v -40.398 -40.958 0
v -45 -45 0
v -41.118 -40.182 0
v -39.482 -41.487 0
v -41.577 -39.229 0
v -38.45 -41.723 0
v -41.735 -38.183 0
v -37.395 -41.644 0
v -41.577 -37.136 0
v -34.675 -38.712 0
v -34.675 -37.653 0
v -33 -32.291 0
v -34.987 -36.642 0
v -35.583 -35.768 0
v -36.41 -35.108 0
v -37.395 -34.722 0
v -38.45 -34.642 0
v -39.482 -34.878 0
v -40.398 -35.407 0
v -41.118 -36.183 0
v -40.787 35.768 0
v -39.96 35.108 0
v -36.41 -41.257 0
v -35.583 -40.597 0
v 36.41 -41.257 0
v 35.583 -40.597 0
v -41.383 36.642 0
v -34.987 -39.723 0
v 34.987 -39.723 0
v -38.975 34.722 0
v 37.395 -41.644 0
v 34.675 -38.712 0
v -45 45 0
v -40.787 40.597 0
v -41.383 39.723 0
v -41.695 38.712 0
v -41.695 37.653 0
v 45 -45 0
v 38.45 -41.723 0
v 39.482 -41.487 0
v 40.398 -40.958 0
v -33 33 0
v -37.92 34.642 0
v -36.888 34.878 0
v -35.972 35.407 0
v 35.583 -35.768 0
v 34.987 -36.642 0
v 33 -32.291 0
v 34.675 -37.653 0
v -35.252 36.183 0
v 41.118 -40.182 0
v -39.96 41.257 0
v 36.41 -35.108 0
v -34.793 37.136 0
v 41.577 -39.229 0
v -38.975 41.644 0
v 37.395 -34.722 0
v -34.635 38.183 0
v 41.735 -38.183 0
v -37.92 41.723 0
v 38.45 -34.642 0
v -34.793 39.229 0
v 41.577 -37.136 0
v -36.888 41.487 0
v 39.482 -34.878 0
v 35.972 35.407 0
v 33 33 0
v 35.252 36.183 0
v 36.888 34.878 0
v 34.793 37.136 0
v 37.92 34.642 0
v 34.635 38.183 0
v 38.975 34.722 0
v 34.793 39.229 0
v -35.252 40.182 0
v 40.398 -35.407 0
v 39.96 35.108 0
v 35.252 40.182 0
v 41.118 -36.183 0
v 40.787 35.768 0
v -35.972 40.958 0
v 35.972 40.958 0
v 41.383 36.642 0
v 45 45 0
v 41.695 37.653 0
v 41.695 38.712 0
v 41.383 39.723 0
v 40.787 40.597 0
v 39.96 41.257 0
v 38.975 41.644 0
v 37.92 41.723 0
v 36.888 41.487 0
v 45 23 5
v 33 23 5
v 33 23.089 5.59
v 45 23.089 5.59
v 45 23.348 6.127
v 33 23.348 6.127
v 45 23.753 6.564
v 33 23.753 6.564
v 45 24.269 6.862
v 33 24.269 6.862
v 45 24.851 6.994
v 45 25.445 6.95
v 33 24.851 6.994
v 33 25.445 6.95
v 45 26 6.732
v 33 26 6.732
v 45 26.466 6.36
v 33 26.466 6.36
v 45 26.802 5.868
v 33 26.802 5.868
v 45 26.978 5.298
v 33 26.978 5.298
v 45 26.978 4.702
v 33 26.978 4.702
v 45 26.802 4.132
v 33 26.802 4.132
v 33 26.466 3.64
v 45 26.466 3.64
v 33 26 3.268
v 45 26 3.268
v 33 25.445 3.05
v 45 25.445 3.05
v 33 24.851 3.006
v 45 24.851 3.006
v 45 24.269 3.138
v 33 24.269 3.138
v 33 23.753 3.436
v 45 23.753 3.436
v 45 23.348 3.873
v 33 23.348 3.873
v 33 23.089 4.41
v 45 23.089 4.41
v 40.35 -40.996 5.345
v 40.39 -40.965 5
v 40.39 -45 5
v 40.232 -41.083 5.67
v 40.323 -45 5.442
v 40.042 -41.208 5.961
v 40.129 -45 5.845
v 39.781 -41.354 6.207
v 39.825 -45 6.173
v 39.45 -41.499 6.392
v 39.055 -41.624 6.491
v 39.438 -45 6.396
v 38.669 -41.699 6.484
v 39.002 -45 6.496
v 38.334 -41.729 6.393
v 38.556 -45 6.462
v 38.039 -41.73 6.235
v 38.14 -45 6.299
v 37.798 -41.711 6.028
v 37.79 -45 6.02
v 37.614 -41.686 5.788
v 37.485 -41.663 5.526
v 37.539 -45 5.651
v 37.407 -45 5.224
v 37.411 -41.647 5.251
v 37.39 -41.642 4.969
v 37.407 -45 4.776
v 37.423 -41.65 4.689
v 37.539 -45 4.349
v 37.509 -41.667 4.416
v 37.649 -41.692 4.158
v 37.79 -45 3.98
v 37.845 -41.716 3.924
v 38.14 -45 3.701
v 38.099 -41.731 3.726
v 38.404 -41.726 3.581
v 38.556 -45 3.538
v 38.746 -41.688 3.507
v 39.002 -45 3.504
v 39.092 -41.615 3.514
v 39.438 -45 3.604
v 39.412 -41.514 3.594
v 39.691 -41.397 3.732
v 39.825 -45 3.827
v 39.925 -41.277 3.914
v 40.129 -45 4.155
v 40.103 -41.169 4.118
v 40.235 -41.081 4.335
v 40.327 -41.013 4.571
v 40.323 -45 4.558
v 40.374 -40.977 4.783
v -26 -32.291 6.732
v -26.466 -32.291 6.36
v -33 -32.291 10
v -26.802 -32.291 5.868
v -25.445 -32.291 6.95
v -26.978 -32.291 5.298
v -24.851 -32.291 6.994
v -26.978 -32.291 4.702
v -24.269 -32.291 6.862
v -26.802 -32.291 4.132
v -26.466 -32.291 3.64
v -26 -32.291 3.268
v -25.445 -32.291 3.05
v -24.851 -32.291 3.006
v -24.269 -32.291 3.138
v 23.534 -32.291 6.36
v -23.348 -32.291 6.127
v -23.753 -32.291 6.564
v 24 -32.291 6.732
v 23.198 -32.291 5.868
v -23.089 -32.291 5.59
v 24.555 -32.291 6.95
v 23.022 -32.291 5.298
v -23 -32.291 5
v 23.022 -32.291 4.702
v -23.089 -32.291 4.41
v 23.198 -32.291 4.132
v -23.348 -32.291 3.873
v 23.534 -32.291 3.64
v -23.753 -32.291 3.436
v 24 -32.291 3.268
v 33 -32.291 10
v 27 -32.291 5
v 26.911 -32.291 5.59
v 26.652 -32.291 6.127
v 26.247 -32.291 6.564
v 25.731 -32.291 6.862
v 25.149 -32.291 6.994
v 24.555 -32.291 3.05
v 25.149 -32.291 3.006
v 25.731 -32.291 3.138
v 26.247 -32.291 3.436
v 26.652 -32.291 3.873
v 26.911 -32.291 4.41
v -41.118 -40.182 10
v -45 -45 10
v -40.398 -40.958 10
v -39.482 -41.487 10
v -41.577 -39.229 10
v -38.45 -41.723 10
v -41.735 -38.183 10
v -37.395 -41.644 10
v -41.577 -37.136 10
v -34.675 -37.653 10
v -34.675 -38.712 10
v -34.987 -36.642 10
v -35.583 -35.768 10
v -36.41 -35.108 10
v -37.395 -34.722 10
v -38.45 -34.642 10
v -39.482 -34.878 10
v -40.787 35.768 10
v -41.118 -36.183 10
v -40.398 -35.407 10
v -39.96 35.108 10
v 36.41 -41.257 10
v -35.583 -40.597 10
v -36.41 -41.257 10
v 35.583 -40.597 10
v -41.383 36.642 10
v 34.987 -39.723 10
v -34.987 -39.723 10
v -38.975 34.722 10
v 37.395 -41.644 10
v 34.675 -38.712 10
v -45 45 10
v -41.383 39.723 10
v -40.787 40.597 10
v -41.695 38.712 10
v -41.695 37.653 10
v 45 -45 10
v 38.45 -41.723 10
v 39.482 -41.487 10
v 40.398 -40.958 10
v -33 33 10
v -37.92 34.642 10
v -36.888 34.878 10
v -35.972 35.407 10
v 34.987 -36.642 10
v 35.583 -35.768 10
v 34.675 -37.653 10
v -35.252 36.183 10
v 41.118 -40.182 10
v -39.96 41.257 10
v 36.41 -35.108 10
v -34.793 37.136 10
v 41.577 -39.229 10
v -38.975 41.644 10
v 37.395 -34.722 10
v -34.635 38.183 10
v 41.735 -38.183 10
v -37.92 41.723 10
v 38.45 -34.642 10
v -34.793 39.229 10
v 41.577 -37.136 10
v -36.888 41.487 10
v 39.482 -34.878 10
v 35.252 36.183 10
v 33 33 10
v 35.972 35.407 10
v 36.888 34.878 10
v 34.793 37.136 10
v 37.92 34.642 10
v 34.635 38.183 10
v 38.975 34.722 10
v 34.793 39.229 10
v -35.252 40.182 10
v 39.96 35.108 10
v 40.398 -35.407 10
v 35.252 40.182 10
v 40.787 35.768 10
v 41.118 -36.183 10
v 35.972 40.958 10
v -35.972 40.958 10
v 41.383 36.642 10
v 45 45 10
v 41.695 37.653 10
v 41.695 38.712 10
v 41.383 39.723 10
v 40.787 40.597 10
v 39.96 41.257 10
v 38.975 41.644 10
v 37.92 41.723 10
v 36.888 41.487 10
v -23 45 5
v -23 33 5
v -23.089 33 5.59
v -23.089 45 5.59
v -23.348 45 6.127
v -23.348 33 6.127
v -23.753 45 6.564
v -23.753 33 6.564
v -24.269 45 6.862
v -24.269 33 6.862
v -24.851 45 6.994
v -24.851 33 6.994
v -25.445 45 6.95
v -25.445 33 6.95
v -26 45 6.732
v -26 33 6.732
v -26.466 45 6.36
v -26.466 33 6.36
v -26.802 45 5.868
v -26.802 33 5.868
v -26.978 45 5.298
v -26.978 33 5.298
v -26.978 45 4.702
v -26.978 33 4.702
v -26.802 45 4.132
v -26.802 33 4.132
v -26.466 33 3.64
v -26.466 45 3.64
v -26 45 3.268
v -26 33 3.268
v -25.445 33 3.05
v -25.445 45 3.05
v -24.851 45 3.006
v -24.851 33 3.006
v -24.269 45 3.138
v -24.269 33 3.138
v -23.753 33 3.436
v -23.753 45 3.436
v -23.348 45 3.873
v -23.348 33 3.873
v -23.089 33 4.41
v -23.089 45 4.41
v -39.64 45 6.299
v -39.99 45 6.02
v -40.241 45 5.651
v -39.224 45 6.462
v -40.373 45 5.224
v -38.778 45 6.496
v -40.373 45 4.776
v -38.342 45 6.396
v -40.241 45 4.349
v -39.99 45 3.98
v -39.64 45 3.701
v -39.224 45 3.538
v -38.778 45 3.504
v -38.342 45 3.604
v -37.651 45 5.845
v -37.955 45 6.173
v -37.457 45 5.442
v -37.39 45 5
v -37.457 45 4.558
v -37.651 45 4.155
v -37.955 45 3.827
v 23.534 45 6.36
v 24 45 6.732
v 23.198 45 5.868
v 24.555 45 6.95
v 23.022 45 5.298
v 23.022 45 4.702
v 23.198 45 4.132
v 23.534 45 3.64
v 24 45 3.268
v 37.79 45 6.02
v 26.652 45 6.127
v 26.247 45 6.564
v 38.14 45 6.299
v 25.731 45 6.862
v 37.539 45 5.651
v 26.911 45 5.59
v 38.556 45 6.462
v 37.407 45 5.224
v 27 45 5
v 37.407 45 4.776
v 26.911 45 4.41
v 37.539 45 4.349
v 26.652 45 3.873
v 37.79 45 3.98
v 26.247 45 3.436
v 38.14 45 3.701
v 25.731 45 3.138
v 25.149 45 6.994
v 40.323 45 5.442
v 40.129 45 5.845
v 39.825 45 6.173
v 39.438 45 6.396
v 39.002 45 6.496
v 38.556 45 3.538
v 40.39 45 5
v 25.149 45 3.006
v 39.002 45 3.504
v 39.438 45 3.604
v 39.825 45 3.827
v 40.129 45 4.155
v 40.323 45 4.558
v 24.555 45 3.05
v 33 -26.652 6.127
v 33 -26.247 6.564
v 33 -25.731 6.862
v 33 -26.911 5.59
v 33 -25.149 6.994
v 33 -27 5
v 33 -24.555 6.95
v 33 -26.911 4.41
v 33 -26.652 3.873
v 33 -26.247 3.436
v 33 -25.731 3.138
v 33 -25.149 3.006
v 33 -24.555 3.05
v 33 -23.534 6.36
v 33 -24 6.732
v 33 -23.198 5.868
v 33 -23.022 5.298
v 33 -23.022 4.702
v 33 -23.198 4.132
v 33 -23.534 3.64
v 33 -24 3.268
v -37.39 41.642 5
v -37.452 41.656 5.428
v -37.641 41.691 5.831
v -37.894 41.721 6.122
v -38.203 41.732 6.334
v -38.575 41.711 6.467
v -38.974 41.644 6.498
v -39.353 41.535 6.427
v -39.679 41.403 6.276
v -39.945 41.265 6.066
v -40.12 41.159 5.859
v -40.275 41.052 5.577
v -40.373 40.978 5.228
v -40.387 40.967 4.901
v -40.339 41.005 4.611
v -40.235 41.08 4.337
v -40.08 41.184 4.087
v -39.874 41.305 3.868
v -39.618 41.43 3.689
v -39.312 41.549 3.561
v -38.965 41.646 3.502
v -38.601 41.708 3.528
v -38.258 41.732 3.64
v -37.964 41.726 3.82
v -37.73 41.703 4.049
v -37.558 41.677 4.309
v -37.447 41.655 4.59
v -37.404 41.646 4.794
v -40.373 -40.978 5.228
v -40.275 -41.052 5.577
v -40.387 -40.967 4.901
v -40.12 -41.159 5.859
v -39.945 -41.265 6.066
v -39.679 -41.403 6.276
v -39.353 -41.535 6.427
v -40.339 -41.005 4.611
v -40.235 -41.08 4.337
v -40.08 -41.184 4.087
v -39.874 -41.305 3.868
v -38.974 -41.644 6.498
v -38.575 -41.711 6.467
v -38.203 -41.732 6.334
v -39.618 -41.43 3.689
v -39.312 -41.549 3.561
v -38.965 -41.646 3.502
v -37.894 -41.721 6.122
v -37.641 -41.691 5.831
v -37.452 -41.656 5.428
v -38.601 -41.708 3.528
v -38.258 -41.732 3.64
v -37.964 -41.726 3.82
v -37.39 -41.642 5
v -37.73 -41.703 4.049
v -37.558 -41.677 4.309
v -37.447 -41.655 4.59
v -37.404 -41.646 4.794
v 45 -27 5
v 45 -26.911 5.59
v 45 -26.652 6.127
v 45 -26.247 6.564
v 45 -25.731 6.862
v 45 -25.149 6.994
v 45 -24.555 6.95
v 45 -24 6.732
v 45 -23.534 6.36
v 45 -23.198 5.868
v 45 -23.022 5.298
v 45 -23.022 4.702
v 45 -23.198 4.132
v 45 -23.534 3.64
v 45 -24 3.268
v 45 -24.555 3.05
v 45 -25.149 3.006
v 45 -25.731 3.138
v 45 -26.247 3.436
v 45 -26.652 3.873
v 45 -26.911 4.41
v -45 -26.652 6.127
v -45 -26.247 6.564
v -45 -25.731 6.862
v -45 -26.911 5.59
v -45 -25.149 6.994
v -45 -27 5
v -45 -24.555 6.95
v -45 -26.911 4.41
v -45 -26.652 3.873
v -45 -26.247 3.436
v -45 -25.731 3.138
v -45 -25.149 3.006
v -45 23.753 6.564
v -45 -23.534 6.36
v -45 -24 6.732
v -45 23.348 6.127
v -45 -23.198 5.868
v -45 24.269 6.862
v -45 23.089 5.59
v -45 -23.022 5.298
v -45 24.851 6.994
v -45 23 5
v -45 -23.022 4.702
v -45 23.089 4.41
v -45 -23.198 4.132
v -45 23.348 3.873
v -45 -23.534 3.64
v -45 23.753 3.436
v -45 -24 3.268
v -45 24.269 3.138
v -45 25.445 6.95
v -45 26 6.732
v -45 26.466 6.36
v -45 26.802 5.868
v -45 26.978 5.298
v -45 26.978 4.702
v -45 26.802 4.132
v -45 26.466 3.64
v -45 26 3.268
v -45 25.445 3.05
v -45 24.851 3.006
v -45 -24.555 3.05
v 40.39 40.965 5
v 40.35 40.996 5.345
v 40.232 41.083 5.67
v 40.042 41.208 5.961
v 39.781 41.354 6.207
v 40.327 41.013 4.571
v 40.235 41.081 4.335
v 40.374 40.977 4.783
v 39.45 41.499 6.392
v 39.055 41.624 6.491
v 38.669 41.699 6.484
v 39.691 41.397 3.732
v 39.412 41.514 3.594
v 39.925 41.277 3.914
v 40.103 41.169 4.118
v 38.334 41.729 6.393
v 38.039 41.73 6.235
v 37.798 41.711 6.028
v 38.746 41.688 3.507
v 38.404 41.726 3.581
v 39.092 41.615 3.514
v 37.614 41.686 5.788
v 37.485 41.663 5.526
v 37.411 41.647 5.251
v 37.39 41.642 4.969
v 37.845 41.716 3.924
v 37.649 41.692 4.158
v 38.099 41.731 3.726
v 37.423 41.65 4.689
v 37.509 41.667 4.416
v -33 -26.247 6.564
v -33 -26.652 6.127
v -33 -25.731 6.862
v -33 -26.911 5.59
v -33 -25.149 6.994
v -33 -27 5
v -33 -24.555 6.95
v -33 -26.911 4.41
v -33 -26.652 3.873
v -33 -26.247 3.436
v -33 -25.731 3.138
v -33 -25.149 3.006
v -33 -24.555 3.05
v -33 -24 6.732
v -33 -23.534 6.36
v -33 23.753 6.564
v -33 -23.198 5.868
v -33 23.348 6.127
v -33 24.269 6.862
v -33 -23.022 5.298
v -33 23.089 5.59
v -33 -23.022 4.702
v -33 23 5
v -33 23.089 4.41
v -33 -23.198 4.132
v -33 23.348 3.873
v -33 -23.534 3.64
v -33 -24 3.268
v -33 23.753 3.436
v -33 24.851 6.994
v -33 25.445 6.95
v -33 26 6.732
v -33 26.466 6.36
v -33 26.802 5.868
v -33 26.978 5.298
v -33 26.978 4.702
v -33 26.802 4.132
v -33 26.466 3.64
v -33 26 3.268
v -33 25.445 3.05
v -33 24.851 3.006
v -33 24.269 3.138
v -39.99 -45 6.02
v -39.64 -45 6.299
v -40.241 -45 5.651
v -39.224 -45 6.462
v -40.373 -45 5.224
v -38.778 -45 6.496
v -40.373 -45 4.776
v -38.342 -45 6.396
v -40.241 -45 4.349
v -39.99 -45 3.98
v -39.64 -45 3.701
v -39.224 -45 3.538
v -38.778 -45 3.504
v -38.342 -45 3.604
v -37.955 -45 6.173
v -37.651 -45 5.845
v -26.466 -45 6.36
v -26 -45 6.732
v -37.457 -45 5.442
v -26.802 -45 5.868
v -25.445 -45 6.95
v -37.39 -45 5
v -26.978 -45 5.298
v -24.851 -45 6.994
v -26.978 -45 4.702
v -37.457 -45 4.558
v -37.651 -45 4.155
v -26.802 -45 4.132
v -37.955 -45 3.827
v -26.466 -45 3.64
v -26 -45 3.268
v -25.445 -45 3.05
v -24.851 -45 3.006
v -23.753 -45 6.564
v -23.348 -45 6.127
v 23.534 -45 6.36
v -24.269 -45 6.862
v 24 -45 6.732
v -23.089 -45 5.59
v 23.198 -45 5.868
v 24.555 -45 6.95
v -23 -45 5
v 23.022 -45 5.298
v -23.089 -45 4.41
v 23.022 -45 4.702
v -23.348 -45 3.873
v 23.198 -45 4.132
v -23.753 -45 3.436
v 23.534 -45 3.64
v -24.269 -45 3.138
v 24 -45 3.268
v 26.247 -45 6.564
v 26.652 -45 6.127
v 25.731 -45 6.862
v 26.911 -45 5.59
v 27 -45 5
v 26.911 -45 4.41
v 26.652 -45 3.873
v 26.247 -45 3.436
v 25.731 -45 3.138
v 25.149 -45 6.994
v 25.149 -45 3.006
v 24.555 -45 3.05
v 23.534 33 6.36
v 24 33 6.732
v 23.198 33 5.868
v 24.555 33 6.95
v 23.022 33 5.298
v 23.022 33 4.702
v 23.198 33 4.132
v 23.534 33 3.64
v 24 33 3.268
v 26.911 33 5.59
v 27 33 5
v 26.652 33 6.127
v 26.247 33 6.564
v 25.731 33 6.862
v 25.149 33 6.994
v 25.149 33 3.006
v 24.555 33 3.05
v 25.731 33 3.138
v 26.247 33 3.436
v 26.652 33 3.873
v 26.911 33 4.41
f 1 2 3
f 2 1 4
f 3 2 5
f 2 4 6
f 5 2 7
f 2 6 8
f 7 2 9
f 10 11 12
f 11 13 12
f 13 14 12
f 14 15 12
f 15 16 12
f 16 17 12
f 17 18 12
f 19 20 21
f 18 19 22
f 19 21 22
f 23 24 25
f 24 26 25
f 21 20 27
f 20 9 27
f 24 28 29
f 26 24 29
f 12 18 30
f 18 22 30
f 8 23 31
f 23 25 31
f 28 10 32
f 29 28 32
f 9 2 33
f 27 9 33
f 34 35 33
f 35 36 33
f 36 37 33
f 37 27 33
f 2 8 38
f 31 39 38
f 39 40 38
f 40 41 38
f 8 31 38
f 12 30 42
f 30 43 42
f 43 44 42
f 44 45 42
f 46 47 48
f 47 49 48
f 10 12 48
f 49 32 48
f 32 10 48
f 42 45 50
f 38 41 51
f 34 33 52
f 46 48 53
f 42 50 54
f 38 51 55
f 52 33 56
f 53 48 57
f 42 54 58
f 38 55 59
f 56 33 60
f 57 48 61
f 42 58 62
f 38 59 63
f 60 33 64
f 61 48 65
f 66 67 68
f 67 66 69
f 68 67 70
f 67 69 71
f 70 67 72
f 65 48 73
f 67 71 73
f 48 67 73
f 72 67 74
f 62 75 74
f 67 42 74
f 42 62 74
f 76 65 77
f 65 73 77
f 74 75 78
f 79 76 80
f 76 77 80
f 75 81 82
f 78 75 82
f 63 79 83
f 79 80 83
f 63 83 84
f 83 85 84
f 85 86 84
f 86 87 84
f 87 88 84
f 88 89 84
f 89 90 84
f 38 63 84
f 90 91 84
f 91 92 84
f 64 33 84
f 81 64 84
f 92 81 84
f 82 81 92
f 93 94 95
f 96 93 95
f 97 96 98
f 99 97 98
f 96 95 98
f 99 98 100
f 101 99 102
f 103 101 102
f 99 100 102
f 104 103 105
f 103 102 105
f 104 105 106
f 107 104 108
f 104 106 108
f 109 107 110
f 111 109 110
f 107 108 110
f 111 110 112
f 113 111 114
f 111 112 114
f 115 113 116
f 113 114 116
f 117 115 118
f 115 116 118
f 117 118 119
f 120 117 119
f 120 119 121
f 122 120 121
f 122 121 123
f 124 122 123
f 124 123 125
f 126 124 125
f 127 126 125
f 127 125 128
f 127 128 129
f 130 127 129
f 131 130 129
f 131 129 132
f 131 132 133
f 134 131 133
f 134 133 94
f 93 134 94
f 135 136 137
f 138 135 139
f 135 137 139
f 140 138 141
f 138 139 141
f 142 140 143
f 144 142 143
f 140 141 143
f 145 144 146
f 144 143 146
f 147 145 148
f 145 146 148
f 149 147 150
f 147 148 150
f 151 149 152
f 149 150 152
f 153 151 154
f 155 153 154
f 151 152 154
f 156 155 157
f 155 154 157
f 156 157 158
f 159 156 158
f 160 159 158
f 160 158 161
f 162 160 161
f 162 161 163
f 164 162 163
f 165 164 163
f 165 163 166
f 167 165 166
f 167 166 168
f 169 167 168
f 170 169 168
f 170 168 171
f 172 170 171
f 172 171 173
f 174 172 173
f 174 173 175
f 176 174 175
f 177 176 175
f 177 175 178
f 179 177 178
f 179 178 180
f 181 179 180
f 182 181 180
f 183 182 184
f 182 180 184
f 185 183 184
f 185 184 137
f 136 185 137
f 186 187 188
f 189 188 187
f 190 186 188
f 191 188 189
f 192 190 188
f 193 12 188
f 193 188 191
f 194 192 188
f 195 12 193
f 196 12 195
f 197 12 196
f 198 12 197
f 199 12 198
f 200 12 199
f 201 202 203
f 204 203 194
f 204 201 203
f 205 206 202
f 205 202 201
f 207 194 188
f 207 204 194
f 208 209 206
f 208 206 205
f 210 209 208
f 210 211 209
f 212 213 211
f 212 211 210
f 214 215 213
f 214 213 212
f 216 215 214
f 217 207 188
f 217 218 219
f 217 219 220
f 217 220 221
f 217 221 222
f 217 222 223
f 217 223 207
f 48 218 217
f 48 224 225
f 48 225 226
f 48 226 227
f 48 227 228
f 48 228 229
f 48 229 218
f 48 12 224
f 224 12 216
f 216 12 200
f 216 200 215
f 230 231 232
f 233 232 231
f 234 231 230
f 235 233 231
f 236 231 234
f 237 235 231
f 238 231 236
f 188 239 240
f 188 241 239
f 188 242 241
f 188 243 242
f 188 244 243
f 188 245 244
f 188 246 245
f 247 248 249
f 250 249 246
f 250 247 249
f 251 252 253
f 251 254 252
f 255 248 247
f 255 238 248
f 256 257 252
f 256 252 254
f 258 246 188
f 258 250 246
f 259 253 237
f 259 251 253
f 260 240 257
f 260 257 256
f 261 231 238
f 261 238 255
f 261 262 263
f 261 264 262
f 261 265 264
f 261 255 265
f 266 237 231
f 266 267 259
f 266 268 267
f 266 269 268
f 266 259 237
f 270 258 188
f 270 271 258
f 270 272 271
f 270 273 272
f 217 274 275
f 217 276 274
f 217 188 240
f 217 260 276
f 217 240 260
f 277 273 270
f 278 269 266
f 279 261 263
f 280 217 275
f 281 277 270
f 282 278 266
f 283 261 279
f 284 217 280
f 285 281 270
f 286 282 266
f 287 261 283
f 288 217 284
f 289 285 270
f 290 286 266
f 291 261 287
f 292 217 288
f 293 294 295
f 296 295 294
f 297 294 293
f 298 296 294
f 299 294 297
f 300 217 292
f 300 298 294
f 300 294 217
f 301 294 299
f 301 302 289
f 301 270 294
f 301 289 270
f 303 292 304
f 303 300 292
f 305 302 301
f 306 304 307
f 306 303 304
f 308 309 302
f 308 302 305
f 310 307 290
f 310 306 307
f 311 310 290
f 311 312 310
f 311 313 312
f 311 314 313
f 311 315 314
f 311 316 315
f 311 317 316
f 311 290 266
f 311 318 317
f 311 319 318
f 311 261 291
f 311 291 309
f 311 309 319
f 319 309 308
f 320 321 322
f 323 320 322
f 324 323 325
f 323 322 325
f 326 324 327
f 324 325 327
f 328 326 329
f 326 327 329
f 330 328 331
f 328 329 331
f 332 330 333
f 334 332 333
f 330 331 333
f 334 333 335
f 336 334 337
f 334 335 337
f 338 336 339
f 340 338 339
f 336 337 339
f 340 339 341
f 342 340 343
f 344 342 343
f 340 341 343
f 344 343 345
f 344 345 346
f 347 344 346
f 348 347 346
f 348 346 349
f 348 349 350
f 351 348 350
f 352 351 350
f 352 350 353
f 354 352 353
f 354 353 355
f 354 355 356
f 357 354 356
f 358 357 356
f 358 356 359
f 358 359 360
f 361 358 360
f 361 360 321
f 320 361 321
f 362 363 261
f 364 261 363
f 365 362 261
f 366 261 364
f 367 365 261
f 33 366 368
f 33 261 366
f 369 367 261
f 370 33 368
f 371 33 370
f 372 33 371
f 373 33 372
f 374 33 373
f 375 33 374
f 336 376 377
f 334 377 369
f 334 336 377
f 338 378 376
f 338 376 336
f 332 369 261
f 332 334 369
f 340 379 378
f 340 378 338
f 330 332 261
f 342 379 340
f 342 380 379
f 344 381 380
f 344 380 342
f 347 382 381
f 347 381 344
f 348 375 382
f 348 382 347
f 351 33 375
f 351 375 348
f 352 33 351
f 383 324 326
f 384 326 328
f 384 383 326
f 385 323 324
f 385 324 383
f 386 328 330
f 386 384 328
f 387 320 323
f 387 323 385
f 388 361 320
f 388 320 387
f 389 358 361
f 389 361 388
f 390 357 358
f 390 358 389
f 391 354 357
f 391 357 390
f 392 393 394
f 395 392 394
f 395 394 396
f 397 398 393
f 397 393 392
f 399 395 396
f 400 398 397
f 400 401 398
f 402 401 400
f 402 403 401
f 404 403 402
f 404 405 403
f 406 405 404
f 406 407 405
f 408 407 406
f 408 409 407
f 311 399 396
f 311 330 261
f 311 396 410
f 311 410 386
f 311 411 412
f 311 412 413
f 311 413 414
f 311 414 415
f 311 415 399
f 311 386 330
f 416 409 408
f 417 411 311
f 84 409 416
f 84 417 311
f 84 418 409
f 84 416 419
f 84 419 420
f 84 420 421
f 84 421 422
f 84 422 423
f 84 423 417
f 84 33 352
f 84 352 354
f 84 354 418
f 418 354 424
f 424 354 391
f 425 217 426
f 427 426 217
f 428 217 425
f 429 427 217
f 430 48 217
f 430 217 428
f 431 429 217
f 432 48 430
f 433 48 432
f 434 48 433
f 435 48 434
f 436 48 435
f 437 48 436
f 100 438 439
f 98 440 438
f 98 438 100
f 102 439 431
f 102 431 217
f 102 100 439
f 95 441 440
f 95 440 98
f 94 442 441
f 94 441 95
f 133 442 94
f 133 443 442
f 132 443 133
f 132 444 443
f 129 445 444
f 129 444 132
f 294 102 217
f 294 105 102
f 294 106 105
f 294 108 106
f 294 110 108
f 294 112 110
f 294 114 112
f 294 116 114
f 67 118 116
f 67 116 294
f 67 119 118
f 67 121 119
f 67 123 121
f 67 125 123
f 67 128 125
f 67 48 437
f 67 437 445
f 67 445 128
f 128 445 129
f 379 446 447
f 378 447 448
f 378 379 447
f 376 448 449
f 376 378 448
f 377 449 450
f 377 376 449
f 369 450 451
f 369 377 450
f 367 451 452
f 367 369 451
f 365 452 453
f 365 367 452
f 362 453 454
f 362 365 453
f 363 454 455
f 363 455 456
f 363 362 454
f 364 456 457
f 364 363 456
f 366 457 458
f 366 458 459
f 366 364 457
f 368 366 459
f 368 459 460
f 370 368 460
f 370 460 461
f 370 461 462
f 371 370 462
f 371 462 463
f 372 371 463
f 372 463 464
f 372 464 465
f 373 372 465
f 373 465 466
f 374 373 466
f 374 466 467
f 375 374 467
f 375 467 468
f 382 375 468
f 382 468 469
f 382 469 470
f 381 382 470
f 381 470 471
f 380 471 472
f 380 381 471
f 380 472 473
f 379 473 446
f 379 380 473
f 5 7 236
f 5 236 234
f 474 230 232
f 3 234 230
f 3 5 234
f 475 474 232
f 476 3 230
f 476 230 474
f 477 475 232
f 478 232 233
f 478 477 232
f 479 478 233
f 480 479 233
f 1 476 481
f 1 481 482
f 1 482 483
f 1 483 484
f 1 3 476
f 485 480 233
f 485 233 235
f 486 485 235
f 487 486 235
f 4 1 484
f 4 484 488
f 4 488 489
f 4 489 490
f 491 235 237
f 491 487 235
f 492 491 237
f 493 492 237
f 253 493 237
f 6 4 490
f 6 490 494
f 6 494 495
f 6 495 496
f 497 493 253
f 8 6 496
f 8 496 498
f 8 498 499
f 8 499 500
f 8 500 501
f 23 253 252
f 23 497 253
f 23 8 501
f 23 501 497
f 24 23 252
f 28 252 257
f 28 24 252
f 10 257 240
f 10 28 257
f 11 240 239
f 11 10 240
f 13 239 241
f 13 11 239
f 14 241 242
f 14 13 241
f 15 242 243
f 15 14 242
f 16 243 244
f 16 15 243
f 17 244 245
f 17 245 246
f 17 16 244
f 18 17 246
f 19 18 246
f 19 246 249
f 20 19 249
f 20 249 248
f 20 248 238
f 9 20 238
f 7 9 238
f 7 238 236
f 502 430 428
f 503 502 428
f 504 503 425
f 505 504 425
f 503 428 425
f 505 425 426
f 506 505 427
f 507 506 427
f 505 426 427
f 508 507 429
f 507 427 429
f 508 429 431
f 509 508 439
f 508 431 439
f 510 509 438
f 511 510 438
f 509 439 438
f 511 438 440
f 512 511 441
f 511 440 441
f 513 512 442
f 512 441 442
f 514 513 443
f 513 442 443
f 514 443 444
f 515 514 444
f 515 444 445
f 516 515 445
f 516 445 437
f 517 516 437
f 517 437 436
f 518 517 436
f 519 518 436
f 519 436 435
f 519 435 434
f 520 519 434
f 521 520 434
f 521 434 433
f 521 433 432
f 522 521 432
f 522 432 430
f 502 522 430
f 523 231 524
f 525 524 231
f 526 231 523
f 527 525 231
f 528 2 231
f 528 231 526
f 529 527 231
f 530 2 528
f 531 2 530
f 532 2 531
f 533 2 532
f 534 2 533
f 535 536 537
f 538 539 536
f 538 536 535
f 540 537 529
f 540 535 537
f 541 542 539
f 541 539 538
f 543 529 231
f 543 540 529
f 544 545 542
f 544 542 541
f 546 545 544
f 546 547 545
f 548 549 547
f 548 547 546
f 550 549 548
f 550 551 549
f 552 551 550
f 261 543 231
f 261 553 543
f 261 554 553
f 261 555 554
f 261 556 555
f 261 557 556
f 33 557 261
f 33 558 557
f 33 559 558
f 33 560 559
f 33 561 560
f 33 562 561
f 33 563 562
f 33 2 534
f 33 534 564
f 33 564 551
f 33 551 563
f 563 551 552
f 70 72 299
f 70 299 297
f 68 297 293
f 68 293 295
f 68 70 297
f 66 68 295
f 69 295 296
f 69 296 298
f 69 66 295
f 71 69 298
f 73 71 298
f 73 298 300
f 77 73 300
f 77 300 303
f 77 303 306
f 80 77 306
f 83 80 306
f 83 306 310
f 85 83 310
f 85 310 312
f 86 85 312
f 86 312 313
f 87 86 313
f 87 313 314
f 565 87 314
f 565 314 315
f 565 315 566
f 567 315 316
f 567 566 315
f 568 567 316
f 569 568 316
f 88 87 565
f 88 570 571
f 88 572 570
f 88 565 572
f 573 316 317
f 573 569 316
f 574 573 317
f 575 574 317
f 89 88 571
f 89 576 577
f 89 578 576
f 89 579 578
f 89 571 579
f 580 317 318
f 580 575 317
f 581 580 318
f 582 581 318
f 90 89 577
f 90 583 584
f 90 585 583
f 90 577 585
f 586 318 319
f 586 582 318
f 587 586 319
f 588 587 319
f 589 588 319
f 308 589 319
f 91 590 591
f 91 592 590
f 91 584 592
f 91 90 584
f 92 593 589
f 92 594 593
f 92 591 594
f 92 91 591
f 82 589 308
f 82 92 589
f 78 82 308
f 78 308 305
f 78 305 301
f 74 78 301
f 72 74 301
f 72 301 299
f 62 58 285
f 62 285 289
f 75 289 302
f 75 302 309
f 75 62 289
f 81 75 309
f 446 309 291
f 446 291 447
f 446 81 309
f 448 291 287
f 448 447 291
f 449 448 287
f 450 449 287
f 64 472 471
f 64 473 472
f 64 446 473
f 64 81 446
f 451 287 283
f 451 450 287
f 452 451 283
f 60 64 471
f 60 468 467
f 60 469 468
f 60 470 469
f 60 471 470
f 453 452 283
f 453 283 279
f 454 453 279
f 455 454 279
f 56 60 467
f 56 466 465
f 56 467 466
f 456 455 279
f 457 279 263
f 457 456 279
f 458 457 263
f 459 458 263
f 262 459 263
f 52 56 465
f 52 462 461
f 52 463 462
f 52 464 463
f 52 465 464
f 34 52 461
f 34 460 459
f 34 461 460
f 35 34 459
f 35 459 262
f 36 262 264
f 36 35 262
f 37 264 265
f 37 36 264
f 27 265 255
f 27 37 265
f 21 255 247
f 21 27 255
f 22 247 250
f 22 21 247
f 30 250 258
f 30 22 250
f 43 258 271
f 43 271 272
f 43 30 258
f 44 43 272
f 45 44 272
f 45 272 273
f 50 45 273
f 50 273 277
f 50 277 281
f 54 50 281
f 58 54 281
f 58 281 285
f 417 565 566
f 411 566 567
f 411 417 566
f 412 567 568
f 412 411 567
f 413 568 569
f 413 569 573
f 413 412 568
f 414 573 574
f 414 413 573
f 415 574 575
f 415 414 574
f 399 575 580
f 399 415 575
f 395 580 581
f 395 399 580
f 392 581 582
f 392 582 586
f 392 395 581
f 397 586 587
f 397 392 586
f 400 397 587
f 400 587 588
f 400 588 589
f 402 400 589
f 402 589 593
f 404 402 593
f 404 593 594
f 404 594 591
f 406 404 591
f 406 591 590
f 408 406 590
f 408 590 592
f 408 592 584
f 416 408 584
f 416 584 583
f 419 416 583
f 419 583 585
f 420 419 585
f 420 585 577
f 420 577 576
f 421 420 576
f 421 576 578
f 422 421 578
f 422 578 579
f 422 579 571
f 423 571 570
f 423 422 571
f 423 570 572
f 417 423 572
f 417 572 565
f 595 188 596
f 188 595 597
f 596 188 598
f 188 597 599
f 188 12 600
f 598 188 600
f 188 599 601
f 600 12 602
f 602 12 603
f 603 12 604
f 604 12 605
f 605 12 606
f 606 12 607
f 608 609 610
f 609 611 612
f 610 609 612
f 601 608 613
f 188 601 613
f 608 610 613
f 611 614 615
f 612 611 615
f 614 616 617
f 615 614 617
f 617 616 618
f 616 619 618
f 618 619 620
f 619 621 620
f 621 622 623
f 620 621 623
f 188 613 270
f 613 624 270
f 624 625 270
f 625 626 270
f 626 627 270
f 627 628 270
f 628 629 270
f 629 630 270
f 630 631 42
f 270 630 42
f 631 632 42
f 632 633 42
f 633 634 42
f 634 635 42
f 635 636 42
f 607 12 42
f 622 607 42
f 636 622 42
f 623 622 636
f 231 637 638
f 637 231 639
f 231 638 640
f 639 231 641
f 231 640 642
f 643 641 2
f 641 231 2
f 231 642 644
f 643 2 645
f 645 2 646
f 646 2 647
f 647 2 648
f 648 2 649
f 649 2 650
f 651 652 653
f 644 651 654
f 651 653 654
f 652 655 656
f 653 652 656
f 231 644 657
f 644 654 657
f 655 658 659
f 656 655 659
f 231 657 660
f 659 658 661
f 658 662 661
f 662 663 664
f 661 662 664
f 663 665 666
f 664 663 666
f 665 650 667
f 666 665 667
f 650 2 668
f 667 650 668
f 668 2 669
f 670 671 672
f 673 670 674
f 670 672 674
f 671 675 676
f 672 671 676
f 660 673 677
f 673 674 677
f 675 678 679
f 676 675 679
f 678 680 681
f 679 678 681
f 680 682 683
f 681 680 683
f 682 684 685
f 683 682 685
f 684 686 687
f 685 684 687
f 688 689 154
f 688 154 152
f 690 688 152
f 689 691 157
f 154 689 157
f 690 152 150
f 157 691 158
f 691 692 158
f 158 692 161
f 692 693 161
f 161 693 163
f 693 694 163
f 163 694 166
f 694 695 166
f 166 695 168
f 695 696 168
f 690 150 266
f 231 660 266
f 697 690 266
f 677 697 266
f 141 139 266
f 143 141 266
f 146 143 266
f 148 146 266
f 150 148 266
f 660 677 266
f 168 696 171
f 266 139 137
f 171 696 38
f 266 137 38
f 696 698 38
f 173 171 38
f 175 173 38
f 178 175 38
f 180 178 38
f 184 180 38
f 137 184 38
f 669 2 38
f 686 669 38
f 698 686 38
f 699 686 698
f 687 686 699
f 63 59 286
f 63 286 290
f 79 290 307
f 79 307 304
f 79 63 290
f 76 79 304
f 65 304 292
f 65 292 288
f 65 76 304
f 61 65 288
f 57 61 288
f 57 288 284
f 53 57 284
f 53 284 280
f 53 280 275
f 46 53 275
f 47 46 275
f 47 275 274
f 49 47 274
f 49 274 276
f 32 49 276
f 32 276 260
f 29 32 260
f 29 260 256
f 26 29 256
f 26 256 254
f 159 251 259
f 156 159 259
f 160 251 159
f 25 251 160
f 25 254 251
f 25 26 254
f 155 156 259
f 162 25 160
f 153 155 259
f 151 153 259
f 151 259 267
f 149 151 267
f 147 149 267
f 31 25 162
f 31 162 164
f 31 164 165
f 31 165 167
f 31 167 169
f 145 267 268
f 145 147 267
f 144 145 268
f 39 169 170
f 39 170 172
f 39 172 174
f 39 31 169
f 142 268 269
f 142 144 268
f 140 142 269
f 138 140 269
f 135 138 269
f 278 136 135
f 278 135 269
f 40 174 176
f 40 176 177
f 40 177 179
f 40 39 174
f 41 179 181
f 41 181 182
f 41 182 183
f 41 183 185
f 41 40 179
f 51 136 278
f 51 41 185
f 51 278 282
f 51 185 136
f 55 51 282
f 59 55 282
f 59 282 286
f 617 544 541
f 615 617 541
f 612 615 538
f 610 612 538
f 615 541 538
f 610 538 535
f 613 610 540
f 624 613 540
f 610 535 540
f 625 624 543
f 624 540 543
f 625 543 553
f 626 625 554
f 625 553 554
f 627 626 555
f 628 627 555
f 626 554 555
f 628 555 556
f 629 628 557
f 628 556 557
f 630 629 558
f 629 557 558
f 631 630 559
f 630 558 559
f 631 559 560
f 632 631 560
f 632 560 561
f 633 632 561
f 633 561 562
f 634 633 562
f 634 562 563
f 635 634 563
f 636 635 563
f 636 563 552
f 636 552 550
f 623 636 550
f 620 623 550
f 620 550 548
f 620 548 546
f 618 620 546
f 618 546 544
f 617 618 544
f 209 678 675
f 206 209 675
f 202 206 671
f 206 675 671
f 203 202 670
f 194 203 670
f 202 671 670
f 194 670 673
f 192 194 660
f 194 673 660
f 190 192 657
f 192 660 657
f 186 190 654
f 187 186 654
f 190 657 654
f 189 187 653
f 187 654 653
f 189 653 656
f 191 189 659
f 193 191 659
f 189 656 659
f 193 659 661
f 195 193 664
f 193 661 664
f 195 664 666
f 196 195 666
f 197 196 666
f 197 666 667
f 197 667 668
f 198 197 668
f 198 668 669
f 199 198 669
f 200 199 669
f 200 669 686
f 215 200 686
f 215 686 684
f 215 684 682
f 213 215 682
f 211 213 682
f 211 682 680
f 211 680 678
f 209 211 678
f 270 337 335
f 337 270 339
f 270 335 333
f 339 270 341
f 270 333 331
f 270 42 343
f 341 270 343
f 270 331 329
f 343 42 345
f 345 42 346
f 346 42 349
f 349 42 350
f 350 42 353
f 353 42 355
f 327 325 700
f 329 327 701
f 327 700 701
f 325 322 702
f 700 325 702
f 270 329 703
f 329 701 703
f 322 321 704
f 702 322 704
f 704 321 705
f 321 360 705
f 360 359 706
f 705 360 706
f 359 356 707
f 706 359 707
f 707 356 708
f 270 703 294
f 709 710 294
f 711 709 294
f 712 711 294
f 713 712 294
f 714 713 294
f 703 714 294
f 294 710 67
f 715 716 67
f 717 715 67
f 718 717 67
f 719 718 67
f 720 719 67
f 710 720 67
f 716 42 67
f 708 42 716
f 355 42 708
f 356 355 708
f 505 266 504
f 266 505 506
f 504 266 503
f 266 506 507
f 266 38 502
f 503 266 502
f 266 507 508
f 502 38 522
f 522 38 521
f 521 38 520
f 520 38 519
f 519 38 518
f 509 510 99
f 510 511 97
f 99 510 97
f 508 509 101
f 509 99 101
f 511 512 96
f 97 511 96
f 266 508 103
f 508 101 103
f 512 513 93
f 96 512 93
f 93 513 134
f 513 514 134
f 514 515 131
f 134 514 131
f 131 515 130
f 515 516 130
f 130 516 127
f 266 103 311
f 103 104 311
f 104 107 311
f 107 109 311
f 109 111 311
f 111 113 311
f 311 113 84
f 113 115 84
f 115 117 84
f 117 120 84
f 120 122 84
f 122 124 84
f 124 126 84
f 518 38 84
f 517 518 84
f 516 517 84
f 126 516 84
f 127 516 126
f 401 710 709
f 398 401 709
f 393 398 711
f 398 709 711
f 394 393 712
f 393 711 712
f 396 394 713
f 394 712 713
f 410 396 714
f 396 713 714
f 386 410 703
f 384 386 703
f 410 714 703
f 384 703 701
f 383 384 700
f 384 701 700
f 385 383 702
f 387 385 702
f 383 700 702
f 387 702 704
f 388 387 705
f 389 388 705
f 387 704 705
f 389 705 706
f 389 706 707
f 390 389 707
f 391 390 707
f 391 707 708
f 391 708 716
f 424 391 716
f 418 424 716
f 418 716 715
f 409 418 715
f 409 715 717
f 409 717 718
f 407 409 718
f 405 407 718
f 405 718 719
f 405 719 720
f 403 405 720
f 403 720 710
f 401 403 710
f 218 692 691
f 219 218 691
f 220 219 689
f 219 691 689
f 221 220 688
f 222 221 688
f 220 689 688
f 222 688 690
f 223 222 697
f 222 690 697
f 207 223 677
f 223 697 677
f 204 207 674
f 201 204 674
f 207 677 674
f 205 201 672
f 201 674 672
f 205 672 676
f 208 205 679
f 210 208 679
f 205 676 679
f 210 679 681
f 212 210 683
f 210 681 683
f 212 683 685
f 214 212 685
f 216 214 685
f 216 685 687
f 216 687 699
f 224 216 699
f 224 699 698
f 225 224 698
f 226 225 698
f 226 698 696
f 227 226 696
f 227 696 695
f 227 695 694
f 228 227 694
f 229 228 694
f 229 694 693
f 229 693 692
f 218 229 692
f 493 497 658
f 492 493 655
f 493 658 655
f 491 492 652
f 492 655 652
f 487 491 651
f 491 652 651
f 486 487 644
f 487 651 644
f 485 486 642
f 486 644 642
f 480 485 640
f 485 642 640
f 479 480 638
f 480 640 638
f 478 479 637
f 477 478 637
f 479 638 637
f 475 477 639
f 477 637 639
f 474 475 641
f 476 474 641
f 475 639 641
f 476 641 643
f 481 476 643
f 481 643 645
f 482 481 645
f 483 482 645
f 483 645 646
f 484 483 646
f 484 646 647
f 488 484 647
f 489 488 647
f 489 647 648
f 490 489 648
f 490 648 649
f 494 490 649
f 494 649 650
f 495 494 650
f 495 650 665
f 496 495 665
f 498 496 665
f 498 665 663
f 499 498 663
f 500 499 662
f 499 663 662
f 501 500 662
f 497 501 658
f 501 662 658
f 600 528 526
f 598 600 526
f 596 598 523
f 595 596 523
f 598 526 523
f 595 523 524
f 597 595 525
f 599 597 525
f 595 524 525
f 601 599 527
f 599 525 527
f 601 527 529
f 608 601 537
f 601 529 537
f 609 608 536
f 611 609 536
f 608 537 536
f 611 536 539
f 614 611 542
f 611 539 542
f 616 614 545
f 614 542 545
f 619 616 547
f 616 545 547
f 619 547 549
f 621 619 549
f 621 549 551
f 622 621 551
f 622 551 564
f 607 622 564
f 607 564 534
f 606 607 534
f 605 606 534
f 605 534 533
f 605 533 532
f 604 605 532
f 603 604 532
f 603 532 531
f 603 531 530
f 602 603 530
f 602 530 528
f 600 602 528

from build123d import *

# Parameters (mm, degrees)
SKETCH1_W           = 90
SKETCH1_H           = 90
SKETCH1_R           = 3.55
SKETCH1_W_2         = 66
SKETCH1_H_2         = 65.290786417
BOSS_EXTRUDE1_DEPTH = 10
CUT_EXTRUDE1_REACH  = 103.119
SKETCH2_R           = 1.5
SKETCH3_R           = 2
CUT_EXTRUDE2_DEPTH  = 90
SKETCH4_R           = 2
CUT_EXTRUDE3_DEPTH  = 90


with BuildPart() as part:
    # Sketch1 → Boss-Extrude1 (new body)
    with BuildSketch(Plane.XY):
        Rectangle(SKETCH1_W, SKETCH1_H)
        with Locations((-38.185, 38.182532328)):
            Circle(SKETCH1_R, mode=Mode.SUBTRACT)
        with Locations(Location((38.185, 38.182532328, 0), (0, 0, 180))):
            Circle(SKETCH1_R, mode=Mode.SUBTRACT)
        with Locations((38.185, -38.182532328)):
            Circle(SKETCH1_R, mode=Mode.SUBTRACT)
        with Locations(Location((-38.185, -38.182532328, 0), (0, 0, 180))):
            Circle(SKETCH1_R, mode=Mode.SUBTRACT)
        with Locations((0, 0.354606792)):
            Rectangle(SKETCH1_W_2, SKETCH1_H_2, mode=Mode.SUBTRACT)
    extrude(amount=BOSS_EXTRUDE1_DEPTH)

    # Sketch2 → Cut-Extrude1 (cut, up to next)
    with BuildSketch(Plane.XZ.offset(45), mode=Mode.PRIVATE) as cut_extrude1_sk1:
        with Locations((-38.89, 5)):
            Circle(SKETCH2_R)
    cut_extrude1_tool1 = extrude(cut_extrude1_sk1.sketch, amount=-CUT_EXTRUDE1_REACH, mode=Mode.PRIVATE) & part.part
    # Sketch2 → Cut-Extrude1 (cut, up to next)
    with BuildSketch(Plane.XZ.offset(45), mode=Mode.PRIVATE) as cut_extrude1_sk2:
        with Locations((38.89, 5)):
            Circle(SKETCH2_R)
    cut_extrude1_tool2 = extrude(cut_extrude1_sk2.sketch, amount=-CUT_EXTRUDE1_REACH, mode=Mode.PRIVATE) & part.part
    cut_extrude1_1 = cut_extrude1_tool1.solids().sort_by_distance((-38.89, -45, 5))[0]
    add(cut_extrude1_1, mode=Mode.SUBTRACT)
    cut_extrude1_2 = cut_extrude1_tool2.solids().sort_by_distance((38.89, -45, 5))[0]
    add(cut_extrude1_2, mode=Mode.SUBTRACT)
    cut_extrude1 = cut_extrude1_1 + cut_extrude1_2  # Cut-Extrude1 as one shape, for the pattern or mirror that repeats it

    # Mirror1: Cut-Extrude1 across plane
    add(cut_extrude1.mirror(Plane.ZX), mode=Mode.SUBTRACT)

    # Sketch3 → Cut-Extrude2 (cut)
    with BuildSketch(Plane.XZ.offset(45)):
        with Locations((-25, 5)):
            Circle(SKETCH3_R)
        with Locations((25, 5)):
            Circle(SKETCH3_R)
    extrude(amount=-CUT_EXTRUDE2_DEPTH, mode=Mode.SUBTRACT)

    # Sketch4 → Cut-Extrude3 (cut)
    with BuildSketch(Plane.ZY.offset(45)):
        with Locations(Location((5, 25, 0), (0, 0, 270))):
            Circle(SKETCH4_R)
        with Locations(Location((5, -25, 0), (0, 0, 270))):
            Circle(SKETCH4_R)
    extrude(amount=-CUT_EXTRUDE3_DEPTH, mode=Mode.SUBTRACT)


solid = part.part
